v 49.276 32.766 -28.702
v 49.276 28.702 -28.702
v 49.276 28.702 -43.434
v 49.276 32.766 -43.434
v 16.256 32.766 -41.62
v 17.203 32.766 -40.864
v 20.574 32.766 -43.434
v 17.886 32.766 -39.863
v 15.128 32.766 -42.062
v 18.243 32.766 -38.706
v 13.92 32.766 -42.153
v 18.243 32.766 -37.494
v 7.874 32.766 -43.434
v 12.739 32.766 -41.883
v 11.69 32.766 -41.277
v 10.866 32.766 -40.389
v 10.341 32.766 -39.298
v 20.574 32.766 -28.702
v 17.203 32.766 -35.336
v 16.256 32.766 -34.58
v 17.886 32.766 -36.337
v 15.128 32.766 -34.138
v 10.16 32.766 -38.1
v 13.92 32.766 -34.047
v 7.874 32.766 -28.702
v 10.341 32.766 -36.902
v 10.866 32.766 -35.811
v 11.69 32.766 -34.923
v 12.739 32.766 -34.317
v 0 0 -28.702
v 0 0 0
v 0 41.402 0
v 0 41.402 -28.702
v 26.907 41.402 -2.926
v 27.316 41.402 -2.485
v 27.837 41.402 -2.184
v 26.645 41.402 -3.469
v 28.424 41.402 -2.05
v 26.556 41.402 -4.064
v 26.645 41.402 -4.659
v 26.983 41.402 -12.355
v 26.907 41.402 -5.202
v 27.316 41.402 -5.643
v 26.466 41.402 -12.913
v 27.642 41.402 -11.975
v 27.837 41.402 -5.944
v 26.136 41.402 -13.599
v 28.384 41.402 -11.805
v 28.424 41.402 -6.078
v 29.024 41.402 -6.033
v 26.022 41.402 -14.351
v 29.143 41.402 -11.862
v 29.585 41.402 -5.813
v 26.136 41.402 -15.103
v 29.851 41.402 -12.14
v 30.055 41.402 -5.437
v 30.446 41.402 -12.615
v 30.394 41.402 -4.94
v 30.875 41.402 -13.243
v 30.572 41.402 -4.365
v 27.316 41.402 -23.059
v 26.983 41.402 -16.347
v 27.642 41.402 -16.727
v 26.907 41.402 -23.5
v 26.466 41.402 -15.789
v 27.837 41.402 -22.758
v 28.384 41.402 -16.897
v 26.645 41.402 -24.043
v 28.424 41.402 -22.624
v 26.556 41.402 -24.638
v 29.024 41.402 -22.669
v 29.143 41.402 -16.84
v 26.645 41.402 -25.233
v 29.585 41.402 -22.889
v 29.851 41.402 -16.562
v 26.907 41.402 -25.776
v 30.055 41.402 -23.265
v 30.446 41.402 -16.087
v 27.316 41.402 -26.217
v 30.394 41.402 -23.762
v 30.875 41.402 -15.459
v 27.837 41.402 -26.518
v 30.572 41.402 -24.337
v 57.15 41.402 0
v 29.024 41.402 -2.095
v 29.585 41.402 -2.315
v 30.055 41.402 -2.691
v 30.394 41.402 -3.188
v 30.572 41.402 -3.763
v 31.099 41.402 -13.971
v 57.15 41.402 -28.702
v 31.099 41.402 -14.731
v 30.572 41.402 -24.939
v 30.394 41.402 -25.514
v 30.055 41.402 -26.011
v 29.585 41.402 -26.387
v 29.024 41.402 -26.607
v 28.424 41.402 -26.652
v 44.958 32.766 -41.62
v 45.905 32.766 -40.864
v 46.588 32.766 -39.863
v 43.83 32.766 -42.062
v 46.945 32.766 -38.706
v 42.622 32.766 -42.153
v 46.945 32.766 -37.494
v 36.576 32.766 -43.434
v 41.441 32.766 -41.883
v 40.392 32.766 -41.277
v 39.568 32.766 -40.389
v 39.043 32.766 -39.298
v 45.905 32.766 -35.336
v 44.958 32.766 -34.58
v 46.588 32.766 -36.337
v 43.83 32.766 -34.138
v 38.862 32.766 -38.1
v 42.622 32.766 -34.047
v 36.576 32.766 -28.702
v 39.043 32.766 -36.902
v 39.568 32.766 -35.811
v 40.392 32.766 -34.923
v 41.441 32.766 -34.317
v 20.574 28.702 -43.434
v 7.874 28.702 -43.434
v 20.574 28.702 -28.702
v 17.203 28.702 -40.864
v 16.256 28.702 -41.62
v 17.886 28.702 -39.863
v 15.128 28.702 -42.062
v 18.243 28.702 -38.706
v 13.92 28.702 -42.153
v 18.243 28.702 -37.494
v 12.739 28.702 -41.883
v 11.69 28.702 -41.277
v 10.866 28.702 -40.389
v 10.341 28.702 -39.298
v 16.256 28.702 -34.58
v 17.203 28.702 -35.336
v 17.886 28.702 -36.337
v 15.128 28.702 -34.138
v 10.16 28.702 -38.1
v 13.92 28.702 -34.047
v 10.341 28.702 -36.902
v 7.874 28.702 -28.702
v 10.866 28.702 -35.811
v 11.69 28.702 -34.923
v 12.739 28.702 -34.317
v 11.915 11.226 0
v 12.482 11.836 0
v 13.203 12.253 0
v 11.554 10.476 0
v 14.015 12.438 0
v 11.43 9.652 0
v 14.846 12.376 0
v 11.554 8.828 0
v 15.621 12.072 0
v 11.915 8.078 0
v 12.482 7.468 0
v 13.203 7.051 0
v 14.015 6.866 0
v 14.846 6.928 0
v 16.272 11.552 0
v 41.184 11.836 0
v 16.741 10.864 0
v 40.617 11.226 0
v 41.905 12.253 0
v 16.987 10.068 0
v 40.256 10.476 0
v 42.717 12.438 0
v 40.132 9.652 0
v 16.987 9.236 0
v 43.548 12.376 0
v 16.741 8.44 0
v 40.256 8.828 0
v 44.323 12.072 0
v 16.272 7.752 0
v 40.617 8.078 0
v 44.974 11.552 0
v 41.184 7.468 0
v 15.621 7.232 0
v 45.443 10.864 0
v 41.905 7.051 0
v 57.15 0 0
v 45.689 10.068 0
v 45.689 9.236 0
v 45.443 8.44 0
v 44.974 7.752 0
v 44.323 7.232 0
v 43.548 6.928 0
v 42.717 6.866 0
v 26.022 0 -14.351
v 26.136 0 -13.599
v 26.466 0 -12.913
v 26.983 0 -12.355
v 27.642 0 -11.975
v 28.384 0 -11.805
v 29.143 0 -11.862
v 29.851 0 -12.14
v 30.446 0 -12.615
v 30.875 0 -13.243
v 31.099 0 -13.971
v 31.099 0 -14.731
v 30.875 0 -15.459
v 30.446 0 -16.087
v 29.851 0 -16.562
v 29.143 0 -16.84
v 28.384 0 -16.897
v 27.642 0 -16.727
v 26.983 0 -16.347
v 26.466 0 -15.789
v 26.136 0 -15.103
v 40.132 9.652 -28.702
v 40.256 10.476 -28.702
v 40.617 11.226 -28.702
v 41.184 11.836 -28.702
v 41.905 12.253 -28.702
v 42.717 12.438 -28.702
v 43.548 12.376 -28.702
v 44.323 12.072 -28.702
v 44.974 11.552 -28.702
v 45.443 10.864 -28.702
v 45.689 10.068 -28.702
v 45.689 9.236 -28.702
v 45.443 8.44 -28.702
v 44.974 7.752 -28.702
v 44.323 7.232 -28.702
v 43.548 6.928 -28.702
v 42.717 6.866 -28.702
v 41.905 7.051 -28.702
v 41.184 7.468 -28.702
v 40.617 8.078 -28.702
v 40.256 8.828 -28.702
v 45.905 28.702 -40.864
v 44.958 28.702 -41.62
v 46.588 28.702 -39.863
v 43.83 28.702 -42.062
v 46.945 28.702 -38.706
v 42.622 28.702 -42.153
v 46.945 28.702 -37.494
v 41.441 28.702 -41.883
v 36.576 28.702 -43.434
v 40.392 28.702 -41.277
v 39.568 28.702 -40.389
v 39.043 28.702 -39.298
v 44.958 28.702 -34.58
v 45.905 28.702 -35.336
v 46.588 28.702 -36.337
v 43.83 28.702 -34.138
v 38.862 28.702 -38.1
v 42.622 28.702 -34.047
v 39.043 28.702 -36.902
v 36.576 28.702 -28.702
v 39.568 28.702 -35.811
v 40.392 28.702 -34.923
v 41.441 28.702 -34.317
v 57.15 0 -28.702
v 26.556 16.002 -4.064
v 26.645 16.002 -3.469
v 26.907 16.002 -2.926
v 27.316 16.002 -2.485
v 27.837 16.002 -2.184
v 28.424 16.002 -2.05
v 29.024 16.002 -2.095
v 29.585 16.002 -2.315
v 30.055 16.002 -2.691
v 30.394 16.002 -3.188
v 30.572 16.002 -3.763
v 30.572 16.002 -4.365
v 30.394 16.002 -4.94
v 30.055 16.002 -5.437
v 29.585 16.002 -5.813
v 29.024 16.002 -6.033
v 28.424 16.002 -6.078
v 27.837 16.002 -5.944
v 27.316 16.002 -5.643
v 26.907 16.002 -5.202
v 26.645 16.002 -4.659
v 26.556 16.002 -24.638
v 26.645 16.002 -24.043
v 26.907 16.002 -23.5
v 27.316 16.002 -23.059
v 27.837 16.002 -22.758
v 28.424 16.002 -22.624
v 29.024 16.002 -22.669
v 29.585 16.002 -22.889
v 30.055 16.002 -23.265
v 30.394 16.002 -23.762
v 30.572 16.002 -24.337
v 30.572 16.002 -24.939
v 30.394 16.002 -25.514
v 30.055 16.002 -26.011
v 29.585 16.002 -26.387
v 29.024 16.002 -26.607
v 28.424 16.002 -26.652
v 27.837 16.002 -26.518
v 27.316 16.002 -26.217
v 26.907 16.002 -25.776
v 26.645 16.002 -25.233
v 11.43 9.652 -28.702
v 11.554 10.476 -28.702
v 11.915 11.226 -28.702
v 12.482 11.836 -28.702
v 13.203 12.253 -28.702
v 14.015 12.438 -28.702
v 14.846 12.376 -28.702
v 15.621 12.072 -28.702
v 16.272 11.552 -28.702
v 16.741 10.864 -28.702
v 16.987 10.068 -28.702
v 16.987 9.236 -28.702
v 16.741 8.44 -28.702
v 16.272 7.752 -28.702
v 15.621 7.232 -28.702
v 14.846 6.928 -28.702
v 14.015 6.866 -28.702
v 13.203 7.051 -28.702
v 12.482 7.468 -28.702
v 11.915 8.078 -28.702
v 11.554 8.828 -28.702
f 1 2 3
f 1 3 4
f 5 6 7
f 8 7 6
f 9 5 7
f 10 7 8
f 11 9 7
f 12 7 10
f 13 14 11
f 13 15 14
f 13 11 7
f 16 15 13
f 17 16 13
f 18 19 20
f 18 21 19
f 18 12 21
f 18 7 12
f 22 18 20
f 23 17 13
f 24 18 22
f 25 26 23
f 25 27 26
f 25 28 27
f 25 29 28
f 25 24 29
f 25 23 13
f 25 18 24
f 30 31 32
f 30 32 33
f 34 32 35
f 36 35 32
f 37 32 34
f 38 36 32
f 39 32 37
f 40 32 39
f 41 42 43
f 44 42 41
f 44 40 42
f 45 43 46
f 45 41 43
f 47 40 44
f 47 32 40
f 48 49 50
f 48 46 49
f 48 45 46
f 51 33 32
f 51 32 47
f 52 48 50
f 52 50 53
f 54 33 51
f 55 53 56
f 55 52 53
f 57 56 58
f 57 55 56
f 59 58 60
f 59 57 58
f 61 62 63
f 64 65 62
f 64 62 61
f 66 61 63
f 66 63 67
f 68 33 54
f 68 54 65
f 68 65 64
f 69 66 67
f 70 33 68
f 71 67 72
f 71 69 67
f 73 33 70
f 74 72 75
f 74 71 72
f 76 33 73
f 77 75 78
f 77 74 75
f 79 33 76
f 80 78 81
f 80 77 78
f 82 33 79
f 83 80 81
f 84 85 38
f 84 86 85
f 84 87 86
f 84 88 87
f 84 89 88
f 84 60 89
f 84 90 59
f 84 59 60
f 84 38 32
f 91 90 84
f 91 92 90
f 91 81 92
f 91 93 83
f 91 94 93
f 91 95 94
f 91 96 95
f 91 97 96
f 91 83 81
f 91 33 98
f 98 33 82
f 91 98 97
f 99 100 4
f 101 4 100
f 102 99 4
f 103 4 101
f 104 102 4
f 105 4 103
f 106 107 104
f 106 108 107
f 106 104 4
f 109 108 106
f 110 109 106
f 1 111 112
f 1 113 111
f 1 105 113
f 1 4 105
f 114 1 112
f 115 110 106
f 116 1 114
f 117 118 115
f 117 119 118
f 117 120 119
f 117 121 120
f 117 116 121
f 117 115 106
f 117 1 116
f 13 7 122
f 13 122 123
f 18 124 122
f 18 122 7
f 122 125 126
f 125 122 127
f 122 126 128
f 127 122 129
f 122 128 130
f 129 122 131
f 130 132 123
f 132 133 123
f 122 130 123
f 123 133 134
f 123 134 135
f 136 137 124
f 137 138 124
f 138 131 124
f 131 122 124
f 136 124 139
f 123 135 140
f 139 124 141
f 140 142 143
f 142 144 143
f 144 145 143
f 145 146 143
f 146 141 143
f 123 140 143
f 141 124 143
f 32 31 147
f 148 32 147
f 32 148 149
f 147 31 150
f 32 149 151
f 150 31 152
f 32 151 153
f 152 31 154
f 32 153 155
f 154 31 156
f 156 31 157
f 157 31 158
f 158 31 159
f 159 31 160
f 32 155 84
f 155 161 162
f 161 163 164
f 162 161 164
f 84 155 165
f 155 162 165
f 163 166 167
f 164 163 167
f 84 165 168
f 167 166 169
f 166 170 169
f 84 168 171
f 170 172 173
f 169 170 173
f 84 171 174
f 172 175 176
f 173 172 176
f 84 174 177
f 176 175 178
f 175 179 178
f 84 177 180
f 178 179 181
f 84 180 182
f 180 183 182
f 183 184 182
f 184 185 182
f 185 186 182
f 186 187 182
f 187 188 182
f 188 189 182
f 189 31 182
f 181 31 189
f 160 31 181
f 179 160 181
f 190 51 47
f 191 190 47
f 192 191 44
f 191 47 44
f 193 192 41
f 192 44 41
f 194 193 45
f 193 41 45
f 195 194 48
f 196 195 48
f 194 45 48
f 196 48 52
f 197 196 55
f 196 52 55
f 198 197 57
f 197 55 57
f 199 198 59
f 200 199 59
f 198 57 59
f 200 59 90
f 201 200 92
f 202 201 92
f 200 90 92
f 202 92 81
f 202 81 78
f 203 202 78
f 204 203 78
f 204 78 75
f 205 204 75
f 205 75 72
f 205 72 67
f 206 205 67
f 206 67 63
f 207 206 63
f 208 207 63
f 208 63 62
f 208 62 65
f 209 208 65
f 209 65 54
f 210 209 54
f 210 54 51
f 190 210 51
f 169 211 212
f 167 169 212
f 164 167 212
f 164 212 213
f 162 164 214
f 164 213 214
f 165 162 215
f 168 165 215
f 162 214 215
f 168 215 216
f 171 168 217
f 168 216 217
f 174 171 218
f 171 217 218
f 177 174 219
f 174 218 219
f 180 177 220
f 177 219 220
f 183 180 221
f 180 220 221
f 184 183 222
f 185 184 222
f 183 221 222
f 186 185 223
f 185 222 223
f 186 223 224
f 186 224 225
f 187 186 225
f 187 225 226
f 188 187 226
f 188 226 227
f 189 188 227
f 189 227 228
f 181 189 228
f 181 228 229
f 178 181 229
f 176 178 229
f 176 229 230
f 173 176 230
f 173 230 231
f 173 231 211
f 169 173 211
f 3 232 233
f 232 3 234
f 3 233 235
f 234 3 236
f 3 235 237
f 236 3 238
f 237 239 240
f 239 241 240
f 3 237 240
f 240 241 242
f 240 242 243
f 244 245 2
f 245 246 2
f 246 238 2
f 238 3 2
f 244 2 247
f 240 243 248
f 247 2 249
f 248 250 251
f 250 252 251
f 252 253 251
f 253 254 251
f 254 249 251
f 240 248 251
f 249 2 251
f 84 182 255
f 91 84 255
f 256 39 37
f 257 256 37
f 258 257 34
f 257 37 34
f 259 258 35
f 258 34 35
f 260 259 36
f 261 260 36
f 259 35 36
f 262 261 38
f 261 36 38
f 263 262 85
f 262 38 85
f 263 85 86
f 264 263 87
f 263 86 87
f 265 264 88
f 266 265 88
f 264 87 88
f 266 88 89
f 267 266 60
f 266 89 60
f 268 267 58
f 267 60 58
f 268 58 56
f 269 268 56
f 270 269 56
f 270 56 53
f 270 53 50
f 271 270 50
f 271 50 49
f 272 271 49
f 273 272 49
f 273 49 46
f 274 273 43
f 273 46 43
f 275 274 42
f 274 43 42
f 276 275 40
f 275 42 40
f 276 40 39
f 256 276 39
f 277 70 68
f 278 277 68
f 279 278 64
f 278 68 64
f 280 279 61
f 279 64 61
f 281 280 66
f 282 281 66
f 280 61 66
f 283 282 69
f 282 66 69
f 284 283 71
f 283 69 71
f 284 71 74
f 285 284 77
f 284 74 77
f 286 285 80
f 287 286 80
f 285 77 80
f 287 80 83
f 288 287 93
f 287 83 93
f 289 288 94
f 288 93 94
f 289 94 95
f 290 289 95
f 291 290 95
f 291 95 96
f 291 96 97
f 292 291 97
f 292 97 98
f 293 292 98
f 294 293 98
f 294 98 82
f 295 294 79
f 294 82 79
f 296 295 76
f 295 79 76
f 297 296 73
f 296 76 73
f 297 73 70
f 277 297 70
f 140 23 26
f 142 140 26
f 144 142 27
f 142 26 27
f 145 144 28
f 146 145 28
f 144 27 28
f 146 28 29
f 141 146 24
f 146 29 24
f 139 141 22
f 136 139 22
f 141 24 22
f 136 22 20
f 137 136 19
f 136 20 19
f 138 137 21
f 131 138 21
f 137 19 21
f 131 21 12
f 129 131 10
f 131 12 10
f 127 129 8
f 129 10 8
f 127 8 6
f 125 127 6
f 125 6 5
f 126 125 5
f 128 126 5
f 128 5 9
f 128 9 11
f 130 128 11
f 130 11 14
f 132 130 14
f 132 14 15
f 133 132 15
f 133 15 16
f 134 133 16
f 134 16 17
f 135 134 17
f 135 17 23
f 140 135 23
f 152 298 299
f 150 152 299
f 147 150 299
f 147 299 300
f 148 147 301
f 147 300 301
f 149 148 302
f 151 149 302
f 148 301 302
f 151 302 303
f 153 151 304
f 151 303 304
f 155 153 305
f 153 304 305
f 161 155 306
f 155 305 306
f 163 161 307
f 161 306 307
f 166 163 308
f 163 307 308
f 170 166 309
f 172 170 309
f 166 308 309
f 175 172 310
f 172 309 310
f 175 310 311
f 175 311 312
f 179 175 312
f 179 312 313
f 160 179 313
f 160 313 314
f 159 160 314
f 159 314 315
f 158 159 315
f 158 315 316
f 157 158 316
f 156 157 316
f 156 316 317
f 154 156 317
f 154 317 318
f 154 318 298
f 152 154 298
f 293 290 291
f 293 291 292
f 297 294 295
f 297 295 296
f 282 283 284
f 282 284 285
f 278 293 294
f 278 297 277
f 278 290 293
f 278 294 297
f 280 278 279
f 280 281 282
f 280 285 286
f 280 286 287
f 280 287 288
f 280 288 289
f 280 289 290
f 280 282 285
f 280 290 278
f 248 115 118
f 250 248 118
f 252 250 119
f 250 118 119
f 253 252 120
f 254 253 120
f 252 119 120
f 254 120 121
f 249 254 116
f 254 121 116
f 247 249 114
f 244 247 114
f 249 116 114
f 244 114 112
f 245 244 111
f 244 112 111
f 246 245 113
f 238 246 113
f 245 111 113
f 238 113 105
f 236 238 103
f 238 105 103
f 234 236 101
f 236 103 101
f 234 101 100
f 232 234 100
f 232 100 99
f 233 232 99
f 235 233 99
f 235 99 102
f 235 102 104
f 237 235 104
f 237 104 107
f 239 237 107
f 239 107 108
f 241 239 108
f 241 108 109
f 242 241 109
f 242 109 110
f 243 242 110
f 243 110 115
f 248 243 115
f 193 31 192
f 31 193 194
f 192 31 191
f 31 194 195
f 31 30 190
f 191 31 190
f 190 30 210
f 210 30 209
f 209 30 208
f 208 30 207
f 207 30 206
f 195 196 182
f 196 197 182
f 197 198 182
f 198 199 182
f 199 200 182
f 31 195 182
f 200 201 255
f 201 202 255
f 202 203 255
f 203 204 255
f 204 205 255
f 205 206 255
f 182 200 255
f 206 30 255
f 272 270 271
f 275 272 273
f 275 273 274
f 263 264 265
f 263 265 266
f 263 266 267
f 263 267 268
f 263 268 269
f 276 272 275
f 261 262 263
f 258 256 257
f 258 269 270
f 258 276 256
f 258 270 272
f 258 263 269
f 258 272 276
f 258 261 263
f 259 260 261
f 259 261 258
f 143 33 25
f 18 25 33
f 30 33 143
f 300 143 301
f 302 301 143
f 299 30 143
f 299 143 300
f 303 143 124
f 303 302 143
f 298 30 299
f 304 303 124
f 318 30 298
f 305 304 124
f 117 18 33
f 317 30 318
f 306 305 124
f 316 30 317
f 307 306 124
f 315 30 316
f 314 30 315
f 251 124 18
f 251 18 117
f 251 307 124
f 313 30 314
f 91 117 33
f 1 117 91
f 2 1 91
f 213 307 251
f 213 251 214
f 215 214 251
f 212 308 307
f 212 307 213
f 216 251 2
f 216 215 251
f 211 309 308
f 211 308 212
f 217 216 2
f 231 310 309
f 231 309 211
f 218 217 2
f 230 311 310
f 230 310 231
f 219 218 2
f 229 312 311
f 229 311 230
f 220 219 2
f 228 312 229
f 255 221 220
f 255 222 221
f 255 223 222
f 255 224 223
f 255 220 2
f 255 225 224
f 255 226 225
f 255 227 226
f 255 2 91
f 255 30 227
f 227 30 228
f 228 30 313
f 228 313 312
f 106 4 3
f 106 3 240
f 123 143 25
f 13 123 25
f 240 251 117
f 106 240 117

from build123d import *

# Parameters (mm, degrees)
SKETCH1_W          = 57.15
SKETCH1_H          = 28.702
EXTRUDE1_DEPTH     = 41.402
SKETCH2_R          = 2.5527
CUT_EXTRUDE1_DEPTH = 42.402
SKETCH3_R          = 2.0193
CUT_EXTRUDE2_DEPTH = 25.4
SKETCH8_R          = 2.794
CUT_EXTRUDE3_DEPTH = 29.702
SKETCH9_W          = 12.7
SKETCH9_H          = 4.064
EXTRUDE2_DEPTH     = 14.732
SKETCH10_R         = 4.064
CUT_EXTRUDE4_DEPTH = 33.766


with BuildPart() as part:
    # Sketch1 → Extrude1 (new body)
    with BuildSketch(Plane(origin=(0, 0, 0), x_dir=(1, 0, 0), z_dir=(0, 1, 0))):
        with Locations((28.575, 14.351)):
            Rectangle(SKETCH1_W, SKETCH1_H)
    extrude(amount=EXTRUDE1_DEPTH)

    # Sketch2 → Cut-Extrude1 (cut, through all)
    with BuildSketch(Plane(origin=(0, 41.402, 0), x_dir=(-1, 0, 0), z_dir=(0, 1, 0))):
        with Locations((-28.575, -14.351)):
            Circle(SKETCH2_R)
    extrude(amount=-CUT_EXTRUDE1_DEPTH, mode=Mode.SUBTRACT)

    # Sketch3 → Cut-Extrude2 (cut)
    with BuildSketch(Plane(origin=(0, 41.402, 0), x_dir=(-1, 0, 0), z_dir=(0, 1, 0))):
        with Locations((-28.575, -24.638)):
            Circle(SKETCH3_R)
        with Locations((-28.575, -4.064)):
            Circle(SKETCH3_R)
    extrude(amount=-CUT_EXTRUDE2_DEPTH, mode=Mode.SUBTRACT)

    # Sketch8 → Cut-Extrude3 (cut, through all)
    with BuildSketch(Plane(origin=(0, 0, -28.702), x_dir=(-1, 0, 0), z_dir=(0, 0, -1))):
        with Locations((-42.926, 9.652)):
            Circle(SKETCH8_R)
        with Locations((-14.224, 9.652)):
            Circle(SKETCH8_R)
    extrude(amount=-CUT_EXTRUDE3_DEPTH, mode=Mode.SUBTRACT)

    # Sketch9 → Extrude2 (add)
    with BuildSketch(Plane(origin=(0, 0, -28.702), x_dir=(-1, 0, 0), z_dir=(0, 0, -1))):
        with Locations((-42.926, 30.734)):
            Rectangle(SKETCH9_W, SKETCH9_H)
        with Locations((-14.224, 30.734)):
            Rectangle(SKETCH9_W, SKETCH9_H)
    extrude(amount=EXTRUDE2_DEPTH)

    # Sketch10 → Cut-Extrude4 (cut, through all)
    with BuildSketch(Plane(origin=(0, 32.766, 0), x_dir=(-1, 0, 0), z_dir=(0, 1, 0))):
        with Locations((-42.926, -38.1)):
            Circle(SKETCH10_R)
        with Locations((-14.224, -38.1)):
            Circle(SKETCH10_R)
    extrude(amount=-CUT_EXTRUDE4_DEPTH, mode=Mode.SUBTRACT)


solid = part.part
